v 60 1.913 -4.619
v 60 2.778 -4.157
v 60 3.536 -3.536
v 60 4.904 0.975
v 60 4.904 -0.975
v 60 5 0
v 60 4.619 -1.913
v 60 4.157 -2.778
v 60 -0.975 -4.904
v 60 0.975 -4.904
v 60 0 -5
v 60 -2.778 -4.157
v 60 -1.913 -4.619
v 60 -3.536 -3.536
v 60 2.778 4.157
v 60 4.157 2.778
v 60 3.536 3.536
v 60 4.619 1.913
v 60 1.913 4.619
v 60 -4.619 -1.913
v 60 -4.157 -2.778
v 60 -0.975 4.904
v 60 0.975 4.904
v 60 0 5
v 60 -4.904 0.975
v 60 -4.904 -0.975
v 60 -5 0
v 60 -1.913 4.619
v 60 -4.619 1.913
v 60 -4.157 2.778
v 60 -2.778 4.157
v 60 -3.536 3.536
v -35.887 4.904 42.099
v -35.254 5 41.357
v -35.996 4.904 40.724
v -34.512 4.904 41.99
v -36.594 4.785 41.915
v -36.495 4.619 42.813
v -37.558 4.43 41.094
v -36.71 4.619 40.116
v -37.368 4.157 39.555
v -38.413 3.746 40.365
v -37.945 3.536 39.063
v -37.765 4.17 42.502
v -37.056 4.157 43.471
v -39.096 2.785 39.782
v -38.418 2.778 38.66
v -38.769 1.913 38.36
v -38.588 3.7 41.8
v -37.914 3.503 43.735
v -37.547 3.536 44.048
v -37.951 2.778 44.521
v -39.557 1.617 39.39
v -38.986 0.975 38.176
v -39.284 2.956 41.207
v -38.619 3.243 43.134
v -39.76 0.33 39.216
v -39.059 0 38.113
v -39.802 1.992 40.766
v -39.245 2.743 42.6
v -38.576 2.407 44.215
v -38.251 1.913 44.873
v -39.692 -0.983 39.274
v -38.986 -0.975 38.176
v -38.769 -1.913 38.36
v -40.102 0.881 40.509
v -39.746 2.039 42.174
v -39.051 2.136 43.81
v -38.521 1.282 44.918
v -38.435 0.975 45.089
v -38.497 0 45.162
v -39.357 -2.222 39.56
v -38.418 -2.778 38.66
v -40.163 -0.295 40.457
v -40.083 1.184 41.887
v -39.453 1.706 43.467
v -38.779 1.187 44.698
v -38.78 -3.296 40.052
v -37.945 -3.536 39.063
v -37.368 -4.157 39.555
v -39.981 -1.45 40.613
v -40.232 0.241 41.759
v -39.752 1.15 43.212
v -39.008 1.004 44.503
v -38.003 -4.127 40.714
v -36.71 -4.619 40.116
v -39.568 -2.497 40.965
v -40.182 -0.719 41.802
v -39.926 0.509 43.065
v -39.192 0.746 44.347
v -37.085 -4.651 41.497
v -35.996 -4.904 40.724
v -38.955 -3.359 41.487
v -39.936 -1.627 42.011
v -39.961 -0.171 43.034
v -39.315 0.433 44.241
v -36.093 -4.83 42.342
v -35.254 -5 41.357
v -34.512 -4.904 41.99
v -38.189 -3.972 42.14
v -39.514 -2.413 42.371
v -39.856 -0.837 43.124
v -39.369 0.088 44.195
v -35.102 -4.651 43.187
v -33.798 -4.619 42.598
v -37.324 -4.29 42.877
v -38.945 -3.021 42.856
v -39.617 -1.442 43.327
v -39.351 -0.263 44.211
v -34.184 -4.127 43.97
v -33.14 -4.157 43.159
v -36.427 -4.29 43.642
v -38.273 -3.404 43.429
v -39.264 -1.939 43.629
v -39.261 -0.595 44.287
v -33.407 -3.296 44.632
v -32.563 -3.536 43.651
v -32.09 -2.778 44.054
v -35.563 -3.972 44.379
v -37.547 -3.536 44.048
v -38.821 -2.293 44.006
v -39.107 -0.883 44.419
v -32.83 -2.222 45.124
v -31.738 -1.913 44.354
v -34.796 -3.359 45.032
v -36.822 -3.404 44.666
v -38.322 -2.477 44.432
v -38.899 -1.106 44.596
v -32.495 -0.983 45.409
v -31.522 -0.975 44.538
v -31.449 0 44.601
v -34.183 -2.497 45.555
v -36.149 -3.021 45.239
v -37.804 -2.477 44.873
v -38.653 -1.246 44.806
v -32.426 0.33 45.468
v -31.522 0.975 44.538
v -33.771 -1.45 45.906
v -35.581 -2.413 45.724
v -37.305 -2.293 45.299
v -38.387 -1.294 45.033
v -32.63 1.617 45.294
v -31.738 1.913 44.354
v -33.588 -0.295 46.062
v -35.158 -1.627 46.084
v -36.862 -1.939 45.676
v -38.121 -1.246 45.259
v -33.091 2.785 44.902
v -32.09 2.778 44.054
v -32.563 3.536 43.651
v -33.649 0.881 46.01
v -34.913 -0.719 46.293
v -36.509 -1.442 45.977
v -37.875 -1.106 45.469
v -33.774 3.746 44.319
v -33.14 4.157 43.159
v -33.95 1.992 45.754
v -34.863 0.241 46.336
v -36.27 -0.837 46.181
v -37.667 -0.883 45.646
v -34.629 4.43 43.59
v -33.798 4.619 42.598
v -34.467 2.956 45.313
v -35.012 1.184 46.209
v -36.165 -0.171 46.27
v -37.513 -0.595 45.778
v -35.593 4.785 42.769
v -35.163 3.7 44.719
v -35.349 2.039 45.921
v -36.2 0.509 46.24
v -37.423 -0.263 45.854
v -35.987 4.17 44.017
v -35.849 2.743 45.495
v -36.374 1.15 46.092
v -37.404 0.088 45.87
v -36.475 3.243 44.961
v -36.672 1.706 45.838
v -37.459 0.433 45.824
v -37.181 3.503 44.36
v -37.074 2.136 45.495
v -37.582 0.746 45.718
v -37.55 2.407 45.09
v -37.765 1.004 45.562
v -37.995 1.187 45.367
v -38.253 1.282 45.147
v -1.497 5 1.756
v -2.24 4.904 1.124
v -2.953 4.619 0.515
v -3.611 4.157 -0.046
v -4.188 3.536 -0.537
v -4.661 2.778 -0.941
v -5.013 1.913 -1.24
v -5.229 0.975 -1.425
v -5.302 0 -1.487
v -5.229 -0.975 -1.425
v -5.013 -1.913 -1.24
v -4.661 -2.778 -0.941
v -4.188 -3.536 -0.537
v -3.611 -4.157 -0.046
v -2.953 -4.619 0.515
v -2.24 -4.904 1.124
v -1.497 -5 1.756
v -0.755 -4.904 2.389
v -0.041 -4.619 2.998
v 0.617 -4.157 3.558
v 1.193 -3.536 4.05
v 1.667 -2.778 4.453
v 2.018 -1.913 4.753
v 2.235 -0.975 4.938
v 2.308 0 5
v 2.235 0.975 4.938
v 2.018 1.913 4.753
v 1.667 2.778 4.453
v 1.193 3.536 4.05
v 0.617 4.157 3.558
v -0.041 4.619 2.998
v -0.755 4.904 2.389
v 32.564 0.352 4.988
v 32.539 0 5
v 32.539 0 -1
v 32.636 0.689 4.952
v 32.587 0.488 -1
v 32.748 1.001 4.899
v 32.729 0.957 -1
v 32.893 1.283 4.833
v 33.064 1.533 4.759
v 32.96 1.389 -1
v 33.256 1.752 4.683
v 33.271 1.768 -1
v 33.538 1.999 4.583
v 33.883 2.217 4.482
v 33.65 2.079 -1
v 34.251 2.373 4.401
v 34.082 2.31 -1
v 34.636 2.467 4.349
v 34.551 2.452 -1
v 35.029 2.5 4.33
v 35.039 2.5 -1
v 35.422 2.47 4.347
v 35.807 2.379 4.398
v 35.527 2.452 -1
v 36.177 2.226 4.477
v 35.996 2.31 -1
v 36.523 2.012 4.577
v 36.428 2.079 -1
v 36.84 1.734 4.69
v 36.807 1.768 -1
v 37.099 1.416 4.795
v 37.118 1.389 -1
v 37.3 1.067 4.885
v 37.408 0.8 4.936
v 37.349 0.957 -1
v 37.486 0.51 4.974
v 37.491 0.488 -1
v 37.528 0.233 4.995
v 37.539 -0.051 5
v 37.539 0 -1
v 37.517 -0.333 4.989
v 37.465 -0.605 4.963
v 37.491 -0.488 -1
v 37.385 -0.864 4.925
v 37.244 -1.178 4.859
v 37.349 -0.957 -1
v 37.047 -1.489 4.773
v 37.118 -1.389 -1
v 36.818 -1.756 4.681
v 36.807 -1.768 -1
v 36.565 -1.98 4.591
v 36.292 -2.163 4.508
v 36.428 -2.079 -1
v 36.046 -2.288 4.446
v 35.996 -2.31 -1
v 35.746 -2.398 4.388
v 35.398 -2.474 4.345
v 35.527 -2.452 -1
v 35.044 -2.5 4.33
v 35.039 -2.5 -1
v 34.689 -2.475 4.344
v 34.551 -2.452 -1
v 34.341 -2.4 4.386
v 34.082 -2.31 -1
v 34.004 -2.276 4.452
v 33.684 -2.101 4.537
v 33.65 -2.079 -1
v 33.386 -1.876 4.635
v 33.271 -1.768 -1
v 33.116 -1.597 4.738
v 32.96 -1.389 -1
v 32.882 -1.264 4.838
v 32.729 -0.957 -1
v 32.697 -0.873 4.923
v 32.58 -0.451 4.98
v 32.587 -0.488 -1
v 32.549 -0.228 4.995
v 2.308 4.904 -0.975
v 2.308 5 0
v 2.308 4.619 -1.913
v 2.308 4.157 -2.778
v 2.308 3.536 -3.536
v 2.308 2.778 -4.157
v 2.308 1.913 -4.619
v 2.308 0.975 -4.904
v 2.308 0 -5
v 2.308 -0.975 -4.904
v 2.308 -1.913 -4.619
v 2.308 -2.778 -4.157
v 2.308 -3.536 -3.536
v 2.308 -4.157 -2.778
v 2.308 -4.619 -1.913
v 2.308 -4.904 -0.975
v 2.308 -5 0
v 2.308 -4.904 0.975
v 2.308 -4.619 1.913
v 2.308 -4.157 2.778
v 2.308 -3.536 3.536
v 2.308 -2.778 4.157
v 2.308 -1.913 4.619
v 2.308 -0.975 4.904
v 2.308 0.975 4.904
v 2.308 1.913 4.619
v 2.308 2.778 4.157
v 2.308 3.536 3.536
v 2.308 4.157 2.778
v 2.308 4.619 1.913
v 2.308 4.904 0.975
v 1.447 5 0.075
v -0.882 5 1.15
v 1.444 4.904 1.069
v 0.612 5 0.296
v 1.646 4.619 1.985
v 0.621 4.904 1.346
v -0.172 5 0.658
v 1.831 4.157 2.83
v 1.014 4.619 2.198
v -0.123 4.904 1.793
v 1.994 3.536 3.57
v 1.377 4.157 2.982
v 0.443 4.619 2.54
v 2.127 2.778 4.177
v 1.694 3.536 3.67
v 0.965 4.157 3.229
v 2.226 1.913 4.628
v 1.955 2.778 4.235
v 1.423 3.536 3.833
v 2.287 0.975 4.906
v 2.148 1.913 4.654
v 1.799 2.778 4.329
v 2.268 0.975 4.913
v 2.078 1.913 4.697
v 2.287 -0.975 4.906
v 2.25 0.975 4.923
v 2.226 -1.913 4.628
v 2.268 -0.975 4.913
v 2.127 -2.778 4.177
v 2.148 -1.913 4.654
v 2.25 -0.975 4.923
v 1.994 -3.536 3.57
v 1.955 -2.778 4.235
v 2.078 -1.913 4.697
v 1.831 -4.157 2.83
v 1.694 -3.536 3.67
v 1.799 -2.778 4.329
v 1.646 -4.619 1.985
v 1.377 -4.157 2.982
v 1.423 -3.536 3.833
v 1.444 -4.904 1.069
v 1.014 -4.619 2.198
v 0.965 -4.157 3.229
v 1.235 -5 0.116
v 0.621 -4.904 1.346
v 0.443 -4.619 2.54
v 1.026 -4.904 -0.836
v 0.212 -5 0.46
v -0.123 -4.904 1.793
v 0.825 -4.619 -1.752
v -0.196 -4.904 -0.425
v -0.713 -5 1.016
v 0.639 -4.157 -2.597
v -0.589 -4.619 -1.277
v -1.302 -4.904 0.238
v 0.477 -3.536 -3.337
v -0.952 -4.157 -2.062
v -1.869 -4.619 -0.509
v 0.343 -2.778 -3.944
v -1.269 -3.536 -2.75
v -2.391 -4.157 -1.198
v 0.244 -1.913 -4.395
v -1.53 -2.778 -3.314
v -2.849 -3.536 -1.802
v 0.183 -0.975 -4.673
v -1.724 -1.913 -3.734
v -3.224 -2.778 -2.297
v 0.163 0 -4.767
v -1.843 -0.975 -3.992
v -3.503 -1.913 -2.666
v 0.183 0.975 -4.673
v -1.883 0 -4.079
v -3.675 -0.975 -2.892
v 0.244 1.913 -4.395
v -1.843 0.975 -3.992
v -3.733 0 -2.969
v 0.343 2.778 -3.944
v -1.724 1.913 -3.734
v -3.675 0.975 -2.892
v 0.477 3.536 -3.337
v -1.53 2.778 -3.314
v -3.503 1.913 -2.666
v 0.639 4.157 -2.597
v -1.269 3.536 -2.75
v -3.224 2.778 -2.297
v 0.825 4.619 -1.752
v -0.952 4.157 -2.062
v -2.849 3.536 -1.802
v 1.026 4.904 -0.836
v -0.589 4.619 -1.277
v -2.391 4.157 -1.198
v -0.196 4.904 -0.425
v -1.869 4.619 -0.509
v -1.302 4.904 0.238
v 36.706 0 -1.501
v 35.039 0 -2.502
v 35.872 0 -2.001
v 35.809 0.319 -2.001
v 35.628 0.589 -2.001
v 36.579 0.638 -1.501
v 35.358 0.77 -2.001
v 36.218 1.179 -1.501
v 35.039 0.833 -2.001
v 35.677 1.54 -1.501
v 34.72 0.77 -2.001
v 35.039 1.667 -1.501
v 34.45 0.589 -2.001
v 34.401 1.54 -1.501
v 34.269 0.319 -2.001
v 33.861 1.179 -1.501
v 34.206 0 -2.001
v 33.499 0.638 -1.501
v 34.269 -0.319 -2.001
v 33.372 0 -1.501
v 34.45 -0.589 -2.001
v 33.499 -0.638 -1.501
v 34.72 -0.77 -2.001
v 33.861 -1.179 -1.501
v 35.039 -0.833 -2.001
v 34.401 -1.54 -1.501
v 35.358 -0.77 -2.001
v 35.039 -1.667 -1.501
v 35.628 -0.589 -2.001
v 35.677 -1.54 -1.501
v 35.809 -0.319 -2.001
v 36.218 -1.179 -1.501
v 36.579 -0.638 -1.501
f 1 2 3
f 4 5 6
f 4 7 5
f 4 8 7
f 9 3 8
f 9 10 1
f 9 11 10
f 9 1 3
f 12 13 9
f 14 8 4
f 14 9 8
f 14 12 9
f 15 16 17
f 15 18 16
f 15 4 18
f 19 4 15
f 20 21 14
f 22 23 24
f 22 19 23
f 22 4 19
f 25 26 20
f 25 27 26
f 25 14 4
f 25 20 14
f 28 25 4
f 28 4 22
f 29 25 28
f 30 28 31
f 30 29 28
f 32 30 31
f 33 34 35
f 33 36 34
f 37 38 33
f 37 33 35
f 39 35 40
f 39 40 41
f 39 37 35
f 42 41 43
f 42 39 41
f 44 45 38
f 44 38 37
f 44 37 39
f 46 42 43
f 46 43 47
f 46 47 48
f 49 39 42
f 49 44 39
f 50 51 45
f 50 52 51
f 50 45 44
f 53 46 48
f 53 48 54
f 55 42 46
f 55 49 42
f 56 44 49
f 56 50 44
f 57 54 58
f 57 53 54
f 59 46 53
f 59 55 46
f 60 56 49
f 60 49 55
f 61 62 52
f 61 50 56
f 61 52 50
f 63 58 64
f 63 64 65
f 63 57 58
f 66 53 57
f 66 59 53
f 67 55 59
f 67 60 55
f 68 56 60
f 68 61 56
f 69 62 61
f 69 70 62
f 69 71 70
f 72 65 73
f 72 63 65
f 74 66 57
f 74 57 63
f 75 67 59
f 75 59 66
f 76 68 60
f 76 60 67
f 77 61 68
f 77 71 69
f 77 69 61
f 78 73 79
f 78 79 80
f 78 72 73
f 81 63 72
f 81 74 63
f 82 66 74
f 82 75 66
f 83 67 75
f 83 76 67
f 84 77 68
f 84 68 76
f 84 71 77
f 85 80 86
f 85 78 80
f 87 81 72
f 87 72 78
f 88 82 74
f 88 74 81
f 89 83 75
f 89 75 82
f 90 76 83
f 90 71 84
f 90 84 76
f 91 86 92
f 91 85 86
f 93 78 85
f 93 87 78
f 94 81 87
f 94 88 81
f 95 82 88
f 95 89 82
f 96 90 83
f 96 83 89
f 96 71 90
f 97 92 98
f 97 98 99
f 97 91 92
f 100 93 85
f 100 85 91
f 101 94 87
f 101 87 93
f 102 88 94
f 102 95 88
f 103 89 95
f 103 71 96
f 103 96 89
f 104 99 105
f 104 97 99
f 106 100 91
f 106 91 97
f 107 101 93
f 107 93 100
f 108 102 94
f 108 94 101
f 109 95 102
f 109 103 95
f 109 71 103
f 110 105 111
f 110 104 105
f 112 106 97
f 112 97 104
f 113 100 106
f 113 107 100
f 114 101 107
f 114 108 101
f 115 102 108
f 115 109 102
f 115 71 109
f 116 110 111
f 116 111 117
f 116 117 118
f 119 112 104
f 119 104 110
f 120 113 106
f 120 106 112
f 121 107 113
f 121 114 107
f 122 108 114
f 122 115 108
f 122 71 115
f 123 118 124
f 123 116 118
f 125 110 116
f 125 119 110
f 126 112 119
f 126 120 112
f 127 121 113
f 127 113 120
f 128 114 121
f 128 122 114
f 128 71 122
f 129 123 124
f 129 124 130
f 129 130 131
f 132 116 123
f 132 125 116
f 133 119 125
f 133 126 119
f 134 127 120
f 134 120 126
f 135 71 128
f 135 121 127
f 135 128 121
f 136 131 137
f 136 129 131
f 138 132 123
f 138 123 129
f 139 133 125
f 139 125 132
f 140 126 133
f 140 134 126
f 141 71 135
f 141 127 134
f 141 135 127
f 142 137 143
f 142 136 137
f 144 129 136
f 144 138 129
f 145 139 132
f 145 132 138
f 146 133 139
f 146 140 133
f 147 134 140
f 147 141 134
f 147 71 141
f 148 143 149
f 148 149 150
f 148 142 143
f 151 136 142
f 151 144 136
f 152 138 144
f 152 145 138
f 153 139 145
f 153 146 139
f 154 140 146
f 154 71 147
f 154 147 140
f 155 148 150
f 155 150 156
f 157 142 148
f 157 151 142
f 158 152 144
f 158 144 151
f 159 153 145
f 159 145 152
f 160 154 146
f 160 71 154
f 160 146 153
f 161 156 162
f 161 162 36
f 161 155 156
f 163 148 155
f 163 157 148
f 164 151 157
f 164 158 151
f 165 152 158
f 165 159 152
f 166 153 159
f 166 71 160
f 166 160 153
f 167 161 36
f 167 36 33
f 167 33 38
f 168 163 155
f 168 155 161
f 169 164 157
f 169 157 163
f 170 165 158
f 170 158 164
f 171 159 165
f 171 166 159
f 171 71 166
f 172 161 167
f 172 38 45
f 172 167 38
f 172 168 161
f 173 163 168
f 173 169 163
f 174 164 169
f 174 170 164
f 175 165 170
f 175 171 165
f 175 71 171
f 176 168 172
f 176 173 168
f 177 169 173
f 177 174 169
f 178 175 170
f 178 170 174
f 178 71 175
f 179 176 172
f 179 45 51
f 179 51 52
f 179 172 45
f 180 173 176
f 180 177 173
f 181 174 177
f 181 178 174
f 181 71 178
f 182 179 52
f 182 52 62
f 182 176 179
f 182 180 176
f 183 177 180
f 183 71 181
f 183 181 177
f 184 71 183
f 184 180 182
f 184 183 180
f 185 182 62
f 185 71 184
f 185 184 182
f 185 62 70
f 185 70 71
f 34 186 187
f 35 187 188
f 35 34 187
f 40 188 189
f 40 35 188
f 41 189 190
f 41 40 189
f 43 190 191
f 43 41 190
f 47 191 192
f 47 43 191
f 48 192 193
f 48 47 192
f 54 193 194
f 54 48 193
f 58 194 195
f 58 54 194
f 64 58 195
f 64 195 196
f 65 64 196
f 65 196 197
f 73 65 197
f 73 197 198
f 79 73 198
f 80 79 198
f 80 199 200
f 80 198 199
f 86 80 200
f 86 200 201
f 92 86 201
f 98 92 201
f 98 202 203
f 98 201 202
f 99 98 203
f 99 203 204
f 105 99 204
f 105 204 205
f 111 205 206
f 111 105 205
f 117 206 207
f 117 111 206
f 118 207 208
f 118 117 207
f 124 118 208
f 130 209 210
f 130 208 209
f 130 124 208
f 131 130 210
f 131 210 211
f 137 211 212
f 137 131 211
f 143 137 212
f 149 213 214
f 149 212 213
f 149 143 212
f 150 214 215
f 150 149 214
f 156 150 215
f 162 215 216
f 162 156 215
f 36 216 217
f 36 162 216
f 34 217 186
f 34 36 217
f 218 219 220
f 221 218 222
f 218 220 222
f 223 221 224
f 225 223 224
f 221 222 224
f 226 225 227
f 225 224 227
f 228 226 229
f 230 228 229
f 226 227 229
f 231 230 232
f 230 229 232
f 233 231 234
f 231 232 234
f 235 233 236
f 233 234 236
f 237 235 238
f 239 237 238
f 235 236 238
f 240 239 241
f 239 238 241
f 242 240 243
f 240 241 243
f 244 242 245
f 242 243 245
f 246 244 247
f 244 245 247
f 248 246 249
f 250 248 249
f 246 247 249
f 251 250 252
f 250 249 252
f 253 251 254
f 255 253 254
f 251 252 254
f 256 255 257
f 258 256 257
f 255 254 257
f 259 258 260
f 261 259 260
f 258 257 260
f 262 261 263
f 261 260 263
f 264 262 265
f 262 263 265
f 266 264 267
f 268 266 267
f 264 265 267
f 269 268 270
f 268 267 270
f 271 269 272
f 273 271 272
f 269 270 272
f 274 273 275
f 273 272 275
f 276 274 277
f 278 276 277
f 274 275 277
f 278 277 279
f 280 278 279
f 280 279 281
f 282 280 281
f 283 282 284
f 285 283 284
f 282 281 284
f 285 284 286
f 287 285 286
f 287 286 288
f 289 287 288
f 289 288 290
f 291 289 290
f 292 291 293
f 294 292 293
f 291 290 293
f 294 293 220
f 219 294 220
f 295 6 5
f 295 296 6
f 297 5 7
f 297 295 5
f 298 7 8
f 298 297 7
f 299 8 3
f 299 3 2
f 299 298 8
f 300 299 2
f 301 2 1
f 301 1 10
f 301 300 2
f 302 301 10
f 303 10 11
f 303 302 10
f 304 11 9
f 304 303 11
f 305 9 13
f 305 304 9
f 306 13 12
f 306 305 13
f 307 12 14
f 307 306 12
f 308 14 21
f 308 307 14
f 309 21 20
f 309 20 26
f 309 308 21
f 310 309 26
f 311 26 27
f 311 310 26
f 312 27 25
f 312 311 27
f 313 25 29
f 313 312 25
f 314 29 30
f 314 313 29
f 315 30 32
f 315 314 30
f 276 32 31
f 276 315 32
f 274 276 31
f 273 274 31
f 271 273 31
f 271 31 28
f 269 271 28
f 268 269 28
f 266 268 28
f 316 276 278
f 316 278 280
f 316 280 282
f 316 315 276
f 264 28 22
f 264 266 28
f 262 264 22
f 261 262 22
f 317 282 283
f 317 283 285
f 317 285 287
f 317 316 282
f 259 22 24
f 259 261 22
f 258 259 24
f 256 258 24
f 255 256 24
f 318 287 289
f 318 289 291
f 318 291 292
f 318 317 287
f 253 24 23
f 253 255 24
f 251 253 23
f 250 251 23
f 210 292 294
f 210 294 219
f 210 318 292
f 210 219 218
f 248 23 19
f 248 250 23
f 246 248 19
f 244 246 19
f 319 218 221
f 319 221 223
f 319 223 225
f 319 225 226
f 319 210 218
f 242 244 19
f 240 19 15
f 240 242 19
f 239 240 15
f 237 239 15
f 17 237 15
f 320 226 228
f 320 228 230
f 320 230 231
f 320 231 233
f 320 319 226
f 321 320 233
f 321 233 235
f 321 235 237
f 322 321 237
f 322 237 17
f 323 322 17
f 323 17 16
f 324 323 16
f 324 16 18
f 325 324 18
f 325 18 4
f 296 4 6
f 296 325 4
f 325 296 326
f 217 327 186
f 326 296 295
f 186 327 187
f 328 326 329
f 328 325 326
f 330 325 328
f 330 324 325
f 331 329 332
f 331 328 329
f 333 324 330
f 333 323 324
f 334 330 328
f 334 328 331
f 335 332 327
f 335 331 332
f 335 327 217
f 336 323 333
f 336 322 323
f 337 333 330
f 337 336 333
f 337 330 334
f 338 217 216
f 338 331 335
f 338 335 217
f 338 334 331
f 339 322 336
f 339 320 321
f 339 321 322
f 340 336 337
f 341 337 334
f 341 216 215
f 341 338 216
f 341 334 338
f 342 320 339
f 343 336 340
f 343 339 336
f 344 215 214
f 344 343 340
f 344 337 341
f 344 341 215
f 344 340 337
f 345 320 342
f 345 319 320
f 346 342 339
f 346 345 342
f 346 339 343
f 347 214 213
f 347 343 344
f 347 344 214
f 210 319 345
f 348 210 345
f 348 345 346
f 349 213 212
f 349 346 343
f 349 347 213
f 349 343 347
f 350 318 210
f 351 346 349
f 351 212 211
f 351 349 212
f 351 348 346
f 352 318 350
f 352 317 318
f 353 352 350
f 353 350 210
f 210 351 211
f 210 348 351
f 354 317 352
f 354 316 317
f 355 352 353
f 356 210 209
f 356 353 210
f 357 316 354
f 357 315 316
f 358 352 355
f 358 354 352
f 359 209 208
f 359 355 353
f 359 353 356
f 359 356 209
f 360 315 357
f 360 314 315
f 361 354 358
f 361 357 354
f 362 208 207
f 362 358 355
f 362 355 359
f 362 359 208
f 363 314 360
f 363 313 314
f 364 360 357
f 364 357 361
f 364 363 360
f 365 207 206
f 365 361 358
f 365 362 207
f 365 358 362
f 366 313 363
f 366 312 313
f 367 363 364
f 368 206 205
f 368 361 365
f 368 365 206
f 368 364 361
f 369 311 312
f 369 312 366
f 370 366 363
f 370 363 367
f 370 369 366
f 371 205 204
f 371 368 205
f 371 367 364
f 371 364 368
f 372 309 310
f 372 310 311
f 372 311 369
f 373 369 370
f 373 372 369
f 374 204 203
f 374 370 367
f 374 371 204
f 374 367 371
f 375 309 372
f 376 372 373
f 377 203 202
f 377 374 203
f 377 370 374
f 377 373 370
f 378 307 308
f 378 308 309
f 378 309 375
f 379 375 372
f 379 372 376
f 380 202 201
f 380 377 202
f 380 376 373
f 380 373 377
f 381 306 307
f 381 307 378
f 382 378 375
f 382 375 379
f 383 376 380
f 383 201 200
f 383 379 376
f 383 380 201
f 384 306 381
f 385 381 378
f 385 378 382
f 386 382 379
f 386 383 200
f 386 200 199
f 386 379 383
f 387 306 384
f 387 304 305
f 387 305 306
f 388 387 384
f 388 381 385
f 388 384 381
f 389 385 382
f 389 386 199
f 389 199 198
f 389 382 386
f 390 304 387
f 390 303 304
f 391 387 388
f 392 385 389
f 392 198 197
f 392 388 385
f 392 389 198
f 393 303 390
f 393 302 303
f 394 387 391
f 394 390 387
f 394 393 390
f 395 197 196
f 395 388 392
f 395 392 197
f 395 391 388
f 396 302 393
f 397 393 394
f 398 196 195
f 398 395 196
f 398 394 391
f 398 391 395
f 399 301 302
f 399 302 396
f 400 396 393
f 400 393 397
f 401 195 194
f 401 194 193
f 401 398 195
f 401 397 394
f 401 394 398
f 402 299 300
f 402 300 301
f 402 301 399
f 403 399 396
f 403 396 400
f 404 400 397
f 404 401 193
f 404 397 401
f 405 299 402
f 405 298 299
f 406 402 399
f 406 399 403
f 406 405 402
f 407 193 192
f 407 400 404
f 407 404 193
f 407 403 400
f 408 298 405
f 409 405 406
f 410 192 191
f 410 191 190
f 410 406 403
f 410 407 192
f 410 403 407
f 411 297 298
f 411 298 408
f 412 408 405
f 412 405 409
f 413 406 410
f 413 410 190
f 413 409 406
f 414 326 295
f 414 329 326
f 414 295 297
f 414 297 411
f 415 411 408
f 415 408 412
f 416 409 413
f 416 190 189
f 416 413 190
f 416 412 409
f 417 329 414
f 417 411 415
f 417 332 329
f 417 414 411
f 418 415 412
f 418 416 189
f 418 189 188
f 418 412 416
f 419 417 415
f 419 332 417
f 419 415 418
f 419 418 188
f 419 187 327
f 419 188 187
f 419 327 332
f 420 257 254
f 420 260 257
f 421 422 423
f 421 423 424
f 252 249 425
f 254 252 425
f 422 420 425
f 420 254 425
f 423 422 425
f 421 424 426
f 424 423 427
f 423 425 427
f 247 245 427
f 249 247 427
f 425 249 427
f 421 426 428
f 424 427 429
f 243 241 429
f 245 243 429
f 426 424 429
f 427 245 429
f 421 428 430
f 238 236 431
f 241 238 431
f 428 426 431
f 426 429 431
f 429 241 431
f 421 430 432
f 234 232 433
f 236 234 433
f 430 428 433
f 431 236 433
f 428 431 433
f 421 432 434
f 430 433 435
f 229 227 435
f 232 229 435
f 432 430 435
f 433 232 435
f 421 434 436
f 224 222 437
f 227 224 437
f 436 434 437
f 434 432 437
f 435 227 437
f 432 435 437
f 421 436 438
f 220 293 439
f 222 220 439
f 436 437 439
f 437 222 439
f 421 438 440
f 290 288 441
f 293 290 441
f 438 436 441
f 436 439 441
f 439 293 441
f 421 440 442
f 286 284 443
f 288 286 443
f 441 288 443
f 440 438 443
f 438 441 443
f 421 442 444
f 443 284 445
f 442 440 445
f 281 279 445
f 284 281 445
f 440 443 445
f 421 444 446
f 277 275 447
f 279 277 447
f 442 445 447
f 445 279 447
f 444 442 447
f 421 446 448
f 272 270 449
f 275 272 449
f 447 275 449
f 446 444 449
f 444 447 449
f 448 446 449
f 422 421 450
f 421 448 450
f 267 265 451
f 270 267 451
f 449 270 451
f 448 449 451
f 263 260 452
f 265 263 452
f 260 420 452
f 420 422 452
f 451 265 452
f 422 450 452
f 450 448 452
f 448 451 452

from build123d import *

# Parameters (mm, degrees)
F2_R     = 5
F7_D     = 5
F7_DEPTH = 6
F7_TIP   = 1.5021515476
F8_R     = 5


with BuildPart() as f3:
    # F3: sweep along a path in F0
    with BuildLine(Plane.XZ) as f3_path:
        Line((60, 0), (2.307932585, 0))
        ThreePointArc((2.307932585, 0), (0.212461852, 0.4602860875), (-1.497202471, 1.7563990372))
        Line((-1.497202471, 1.7563990372), (-38.4974752497, 45.1621806509))
    # F2 (on offset) → F3 (sweep)
    with BuildSketch(Plane.YZ.offset(60)):
        Circle(F2_R)
    sweep(path=f3_path.line)

    # F7
    with Locations(Plane.XY.offset(5)):
        with Locations((35.039074719, 0)):
            Hole(F7_D / 2, depth=F7_DEPTH)
            with Locations((0, 0, -(F7_DEPTH + F7_TIP / 2))):  # 118° drill point
                Cone(0, F7_D / 2, F7_TIP, mode=Mode.SUBTRACT)

    # F8
    f8_edges = [f3.edges().sort_by_distance(p)[0] for p in [
        (-38.497475, -5, 45.162181),
    ]]
    fillet(f8_edges, radius=F8_R)


solid = f3.part
